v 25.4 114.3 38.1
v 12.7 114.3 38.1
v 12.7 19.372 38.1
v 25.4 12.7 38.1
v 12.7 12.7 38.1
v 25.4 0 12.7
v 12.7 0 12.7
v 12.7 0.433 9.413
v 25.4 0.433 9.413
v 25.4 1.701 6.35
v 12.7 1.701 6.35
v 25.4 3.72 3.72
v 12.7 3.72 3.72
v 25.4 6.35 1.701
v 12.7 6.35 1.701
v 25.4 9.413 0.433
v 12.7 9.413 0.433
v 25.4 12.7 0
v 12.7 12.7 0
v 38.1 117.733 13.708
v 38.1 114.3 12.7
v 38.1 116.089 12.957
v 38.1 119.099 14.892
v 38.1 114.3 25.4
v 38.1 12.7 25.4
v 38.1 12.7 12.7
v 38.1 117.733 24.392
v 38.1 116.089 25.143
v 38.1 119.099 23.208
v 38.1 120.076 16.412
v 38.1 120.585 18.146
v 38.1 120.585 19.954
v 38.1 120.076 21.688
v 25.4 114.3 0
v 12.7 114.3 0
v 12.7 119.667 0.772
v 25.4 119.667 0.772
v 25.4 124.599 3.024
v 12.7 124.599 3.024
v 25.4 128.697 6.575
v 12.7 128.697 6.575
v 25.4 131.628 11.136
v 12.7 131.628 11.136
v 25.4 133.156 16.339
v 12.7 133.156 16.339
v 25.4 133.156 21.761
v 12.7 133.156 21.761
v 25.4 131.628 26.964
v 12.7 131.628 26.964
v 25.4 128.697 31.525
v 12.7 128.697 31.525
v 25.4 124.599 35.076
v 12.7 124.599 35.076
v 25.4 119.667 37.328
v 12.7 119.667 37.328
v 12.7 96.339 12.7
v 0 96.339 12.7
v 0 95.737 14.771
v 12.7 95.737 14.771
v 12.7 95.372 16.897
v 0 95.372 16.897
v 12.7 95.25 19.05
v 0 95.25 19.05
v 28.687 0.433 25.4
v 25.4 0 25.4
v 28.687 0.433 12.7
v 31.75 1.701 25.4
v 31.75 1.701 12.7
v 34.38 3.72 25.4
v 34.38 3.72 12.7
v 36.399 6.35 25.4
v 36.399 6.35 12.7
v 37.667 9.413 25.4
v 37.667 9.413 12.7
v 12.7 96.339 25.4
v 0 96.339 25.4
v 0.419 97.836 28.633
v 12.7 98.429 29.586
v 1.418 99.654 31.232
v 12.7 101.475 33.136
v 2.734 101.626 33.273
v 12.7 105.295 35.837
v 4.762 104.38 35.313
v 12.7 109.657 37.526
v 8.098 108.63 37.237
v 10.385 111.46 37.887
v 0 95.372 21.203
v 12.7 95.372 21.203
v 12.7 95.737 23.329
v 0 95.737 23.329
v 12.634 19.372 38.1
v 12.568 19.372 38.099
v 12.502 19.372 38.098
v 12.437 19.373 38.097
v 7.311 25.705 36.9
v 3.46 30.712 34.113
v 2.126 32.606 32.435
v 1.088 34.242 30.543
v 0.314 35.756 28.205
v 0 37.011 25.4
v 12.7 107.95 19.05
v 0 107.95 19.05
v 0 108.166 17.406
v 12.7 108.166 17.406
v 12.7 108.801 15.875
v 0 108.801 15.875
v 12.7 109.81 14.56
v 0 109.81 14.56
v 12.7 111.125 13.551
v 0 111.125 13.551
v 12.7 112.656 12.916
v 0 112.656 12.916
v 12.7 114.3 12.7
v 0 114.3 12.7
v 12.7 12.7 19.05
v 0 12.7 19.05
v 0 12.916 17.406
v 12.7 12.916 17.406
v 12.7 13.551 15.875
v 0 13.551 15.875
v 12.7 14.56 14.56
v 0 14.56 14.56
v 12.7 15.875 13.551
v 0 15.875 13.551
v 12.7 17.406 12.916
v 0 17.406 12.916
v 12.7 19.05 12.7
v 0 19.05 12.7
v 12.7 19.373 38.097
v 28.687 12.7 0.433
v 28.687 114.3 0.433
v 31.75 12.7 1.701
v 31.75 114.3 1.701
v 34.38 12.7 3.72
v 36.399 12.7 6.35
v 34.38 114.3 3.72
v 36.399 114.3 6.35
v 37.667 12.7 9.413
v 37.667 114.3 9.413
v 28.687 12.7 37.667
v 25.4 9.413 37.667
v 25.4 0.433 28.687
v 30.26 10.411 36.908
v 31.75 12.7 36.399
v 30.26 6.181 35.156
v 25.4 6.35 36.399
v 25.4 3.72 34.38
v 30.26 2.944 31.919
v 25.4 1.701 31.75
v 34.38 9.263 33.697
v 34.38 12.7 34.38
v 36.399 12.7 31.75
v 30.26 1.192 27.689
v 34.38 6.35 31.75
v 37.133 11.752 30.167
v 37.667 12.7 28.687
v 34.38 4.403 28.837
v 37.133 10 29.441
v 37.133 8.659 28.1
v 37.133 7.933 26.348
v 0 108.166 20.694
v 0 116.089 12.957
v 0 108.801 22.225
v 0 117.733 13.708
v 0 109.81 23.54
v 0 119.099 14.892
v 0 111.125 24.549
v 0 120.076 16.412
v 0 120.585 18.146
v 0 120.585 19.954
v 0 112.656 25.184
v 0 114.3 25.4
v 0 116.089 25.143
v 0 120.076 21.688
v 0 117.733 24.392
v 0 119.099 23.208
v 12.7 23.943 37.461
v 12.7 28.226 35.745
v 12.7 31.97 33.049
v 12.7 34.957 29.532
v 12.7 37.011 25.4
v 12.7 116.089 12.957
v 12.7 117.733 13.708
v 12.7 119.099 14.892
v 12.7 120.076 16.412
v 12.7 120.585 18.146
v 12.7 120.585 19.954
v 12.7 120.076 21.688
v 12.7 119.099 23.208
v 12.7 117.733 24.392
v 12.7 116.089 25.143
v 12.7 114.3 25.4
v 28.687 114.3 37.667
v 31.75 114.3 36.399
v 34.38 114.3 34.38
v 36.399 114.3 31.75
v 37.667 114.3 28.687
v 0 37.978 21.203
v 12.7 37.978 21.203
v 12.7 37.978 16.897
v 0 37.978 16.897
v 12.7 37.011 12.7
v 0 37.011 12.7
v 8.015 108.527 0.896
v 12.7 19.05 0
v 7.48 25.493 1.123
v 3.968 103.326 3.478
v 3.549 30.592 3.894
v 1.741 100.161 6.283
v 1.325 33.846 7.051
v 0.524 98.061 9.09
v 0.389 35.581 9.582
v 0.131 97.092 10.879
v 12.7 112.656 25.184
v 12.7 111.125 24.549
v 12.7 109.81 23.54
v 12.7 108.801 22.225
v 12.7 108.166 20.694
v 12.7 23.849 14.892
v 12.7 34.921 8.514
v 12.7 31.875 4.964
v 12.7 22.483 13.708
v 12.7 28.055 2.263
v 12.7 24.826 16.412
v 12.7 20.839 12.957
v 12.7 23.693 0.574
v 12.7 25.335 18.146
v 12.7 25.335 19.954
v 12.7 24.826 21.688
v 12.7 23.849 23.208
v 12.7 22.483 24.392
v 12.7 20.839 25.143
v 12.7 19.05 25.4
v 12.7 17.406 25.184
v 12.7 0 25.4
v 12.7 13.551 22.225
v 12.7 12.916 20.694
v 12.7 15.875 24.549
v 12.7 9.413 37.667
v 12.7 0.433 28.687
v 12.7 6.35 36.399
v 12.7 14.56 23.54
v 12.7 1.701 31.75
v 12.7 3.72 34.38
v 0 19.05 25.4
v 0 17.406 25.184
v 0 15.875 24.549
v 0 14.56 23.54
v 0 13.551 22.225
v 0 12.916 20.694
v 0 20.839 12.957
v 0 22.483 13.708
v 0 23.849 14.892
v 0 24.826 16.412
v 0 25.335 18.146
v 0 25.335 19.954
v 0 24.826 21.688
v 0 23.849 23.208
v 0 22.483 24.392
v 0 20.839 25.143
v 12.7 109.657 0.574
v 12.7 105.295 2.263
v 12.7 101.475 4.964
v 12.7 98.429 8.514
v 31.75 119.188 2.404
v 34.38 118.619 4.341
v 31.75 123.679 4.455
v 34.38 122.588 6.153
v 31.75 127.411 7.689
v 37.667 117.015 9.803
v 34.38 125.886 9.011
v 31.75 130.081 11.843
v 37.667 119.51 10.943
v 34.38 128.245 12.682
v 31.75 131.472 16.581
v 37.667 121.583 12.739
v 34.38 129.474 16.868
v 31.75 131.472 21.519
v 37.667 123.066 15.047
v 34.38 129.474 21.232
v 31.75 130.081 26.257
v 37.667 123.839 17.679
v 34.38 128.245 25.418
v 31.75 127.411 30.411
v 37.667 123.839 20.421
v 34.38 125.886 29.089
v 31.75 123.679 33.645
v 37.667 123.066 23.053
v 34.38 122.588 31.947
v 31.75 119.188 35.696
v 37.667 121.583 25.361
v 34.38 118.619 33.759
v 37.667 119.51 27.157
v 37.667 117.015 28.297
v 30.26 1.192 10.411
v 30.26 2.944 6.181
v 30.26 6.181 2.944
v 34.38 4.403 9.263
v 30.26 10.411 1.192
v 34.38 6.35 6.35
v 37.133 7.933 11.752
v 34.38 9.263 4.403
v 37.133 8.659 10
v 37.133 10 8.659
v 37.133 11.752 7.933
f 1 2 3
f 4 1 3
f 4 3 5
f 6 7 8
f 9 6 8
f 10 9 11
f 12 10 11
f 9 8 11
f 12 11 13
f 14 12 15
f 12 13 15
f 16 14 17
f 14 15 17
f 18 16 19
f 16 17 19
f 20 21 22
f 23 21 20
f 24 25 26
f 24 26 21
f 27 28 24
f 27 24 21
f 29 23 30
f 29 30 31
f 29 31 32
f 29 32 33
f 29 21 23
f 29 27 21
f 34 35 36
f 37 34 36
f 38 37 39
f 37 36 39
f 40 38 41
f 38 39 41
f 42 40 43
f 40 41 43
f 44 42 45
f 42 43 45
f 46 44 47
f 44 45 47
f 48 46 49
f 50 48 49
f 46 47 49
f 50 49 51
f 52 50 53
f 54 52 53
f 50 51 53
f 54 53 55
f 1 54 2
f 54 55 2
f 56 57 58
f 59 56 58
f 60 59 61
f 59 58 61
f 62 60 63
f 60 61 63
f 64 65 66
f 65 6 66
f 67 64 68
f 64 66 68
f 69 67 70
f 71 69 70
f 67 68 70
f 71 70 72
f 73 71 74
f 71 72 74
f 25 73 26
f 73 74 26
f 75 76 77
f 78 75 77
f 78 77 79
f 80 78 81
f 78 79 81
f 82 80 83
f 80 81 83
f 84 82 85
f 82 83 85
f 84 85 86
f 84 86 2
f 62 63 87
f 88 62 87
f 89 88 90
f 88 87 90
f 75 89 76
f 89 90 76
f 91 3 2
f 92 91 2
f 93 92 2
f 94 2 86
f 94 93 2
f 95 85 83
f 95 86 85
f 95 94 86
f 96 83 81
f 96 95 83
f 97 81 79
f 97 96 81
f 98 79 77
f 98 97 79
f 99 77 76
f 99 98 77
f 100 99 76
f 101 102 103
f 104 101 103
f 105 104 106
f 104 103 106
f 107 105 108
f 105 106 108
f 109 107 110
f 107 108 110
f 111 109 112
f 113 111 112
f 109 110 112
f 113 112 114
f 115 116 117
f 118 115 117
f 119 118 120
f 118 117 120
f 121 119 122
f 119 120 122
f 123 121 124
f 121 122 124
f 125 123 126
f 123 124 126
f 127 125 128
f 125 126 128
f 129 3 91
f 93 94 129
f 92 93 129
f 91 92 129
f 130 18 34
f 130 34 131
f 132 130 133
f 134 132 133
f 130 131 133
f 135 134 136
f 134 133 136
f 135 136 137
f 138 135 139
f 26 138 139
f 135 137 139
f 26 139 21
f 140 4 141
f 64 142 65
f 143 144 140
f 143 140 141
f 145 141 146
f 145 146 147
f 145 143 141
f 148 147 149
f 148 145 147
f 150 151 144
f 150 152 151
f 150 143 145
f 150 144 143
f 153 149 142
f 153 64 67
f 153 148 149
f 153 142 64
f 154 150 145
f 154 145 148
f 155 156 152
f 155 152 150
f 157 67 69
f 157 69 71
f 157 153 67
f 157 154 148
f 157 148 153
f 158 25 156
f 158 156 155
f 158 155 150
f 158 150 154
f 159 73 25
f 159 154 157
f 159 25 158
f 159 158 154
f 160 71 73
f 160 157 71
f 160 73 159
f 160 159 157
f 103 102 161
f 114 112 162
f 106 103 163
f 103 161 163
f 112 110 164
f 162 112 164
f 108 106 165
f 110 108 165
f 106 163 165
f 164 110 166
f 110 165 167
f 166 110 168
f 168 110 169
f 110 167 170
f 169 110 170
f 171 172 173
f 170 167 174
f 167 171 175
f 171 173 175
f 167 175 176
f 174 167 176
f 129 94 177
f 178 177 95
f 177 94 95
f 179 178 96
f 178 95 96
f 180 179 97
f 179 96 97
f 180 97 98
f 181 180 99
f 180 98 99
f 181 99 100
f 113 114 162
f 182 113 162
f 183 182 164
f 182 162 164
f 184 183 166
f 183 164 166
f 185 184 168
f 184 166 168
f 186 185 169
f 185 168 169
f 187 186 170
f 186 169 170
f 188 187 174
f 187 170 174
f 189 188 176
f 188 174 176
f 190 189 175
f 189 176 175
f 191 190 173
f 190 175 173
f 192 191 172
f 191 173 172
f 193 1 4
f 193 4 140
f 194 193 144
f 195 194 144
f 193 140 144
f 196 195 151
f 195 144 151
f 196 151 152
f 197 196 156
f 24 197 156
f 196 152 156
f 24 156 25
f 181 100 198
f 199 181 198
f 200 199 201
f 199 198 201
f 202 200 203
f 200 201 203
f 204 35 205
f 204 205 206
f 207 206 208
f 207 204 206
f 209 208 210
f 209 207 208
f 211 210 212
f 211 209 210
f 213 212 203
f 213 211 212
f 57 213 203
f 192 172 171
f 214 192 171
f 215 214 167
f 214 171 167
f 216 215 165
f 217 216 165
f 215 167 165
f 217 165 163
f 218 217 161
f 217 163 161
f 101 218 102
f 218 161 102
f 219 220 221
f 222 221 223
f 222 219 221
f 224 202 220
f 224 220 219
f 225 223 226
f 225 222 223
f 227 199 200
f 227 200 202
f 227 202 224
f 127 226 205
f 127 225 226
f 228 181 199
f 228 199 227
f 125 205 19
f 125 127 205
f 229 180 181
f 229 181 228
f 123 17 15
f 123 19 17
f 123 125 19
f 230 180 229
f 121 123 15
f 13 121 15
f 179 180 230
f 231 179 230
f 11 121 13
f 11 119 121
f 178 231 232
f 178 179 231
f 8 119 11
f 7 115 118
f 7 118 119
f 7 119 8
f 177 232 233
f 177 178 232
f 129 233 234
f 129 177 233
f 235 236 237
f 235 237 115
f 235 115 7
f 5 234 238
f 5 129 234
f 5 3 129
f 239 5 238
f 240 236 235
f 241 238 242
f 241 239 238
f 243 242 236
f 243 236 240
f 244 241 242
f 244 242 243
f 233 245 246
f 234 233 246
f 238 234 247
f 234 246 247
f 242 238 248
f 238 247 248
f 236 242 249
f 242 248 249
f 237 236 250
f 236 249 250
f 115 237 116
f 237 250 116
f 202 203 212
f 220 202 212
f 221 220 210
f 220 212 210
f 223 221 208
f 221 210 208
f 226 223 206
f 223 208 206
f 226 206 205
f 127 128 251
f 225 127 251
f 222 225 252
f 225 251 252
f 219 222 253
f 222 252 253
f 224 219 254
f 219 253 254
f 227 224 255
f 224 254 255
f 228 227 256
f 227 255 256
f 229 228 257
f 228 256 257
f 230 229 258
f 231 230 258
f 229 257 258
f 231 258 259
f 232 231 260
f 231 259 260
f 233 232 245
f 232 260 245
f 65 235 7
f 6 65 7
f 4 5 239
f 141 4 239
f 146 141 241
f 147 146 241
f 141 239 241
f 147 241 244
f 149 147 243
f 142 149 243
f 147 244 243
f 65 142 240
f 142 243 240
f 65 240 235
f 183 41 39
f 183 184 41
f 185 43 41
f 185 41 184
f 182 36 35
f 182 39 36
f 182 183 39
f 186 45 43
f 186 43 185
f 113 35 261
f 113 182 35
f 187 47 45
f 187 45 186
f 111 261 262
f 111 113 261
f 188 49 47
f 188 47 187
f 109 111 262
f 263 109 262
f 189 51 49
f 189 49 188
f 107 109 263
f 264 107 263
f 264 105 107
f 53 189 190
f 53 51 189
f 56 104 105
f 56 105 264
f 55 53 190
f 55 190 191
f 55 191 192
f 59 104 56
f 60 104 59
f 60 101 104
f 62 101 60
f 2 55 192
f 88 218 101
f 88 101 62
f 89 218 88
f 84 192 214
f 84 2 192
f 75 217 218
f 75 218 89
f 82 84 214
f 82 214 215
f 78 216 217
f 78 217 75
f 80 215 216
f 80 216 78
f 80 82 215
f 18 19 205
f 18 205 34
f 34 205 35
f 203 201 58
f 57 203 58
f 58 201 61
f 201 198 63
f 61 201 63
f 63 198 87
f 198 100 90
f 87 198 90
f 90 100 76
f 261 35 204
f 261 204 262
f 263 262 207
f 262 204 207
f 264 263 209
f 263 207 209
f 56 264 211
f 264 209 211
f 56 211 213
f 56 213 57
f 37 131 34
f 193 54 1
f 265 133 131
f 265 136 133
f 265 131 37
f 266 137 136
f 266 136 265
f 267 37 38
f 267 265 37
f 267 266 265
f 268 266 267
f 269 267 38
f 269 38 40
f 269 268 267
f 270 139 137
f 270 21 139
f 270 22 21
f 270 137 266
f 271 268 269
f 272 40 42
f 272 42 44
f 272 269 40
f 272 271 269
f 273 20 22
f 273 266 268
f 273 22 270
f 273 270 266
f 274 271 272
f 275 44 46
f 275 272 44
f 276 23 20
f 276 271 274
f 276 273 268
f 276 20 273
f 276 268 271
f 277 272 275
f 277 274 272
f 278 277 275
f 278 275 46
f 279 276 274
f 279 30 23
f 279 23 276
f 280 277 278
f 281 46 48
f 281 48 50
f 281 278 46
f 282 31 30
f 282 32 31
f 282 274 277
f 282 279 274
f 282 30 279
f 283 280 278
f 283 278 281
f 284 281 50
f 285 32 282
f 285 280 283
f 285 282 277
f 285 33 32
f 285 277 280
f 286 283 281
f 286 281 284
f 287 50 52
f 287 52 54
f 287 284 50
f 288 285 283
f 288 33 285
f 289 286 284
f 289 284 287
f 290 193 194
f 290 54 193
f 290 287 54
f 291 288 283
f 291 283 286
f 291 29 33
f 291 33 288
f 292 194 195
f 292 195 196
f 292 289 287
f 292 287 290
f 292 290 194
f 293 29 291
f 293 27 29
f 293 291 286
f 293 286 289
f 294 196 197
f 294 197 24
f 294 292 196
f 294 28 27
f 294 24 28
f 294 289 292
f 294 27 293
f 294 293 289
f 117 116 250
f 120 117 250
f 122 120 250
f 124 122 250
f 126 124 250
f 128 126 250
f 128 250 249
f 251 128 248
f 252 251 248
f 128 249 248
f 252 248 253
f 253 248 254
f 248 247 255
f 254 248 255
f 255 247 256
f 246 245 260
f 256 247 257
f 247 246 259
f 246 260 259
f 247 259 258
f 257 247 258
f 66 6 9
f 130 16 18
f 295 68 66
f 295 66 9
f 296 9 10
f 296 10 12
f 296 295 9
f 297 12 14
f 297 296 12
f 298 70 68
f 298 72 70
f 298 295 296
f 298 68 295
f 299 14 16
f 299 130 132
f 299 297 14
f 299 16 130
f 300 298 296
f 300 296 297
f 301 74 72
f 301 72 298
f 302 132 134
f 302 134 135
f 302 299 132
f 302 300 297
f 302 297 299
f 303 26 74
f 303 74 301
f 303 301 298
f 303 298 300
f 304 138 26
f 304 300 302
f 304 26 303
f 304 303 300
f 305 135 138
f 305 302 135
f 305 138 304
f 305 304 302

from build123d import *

# Parameters (mm, degrees)
F1_DEPTH = 38.1
F2_R     = 12.7
F4_DEPTH = 12.7


with BuildPart() as f1:
    # F0 (on Right) → F1 (new body)
    with BuildSketch(Plane.YZ):
        with BuildLine():
            ThreePointArc((0, 12.7), (3.7197438789, 3.7197438789), (12.7, 0))
            Line((12.7, 0), (88.9, 0))
            Line((88.9, 0), (114.3, 0))
            ThreePointArc((114.3, 0), (133.35, 19.05), (114.3, 38.1))
            Line((114.3, 38.1), (88.9, 38.1))
            Line((88.9, 38.1), (12.7, 38.1))
            ThreePointArc((12.7, 38.1), (3.7197438789, 34.3802561211), (0, 25.4))
            Line((0, 25.4), (0, 12.7))
        make_face()
    extrude(amount=F1_DEPTH)

    # F2
    f2_edges = [f1.edges().sort_by_distance(p)[0] for p in [
        (38.1, 0, 19.05),
        (38.1, 3.719744, 3.719744),
        (38.1, 63.5, 0),
        (38.1, 133.35, 19.05),
        (38.1, 63.5, 38.1),
        (38.1, 3.719744, 34.380256),
        (0, 0, 19.05),
        (0, 3.719744, 3.719744),
        (0, 63.5, 0),
        (0, 133.35, 19.05),
        (0, 63.5, 38.1),
        (0, 3.719744, 34.380256),
    ]]
    fillet(f2_edges, radius=F2_R)

    # F3 (on face) → F4 (cut)
    with BuildSketch(Plane(origin=(0, 0, 0), x_dir=(0, -1, 0), z_dir=(-1, 0, 0))):
        with BuildLine():
            ThreePointArc((-114.3, 25.4), (-109.8098719395, 23.5401280605), (-107.95, 19.05))
            ThreePointArc((-107.95, 19.05), (-109.8098719395, 14.5598719395), (-114.3, 12.7))
            Line((-114.3, 12.7), (-96.3394877579, 12.7))
            ThreePointArc((-96.3394877579, 12.7), (-95.5243474386, 15.8286073053), (-95.25, 19.05))
            ThreePointArc((-95.25, 19.05), (-95.5243474386, 22.2713926947), (-96.3394877579, 25.4))
            Line((-96.3394877579, 25.4), (-114.3, 25.4))
        make_face()
        with BuildLine():
            ThreePointArc((-114.3, 12.7), (-120.65, 19.05), (-114.3, 25.4))
            Line((-114.3, 25.4), (-96.3394877579, 25.4))
            ThreePointArc((-96.3394877579, 25.4), (-133.35, 19.05), (-96.3394877579, 12.7))
            Line((-96.3394877579, 12.7), (-114.3, 12.7))
        make_face()
        with BuildLine():
            Line((-19.05, 25.4), (-37.0105122421, 25.4))
            ThreePointArc((-37.0105122421, 25.4), (-38.1, 19.05), (-37.0105122421, 12.7))
            Line((-37.0105122421, 12.7), (-19.0500000394, 12.7))
            ThreePointArc((-19.0500000394, 12.7), (-25.4, 19.0500000197), (-19.05, 25.4))
        make_face()
        with BuildLine():
            ThreePointArc((-19.3726803674, 38.0972669268), (-30.1798665694, 34.5105488307), (-37.0105122421, 25.4))
            Line((-37.0105122421, 25.4), (-19.05, 25.4))
            Line((-19.05, 25.4), (-12.7, 25.4))
            Line((-12.7, 25.4), (-12.7, 19.05))
            Line((-12.7, 19.05), (-12.7, 12.7))
            Line((-12.7, 12.7), (-19.0500000394, 12.7))
            Line((-19.0500000394, 12.7), (-37.0105122421, 12.7))
            ThreePointArc((-37.0105122421, 12.7), (-30.0485226281, 3.4957401333), (-19.05, 0))
            Line((-19.05, 0), (-15.2826001868, -14.698324725))
            Line((-15.2826001868, -14.698324725), (7.5956550427, -14.698324725))
            Line((7.5956550427, -14.698324725), (22.0383554697, 45.6287078559))
            Line((22.0383554697, 45.6287078559), (-15.4104121029, 51.7636574805))
            Line((-15.4104121029, 51.7636574805), (-19.3726803674, 38.0972669268))
        make_face()
        with BuildLine():
            Line((-12.7, 25.4), (-19.05, 25.4))
            ThreePointArc((-19.05, 25.4), (-14.5598719395, 23.5401280605), (-12.7, 19.05))
            Line((-12.7, 19.05), (-12.7, 25.4))
        make_face()
        with BuildLine():
            ThreePointArc((-12.7, 19.05), (-14.5598719534, 14.5598719255), (-19.0500000394, 12.7))
            Line((-19.0500000394, 12.7), (-12.7, 12.7))
            Line((-12.7, 12.7), (-12.7, 19.05))
        make_face()
    extrude(amount=-F4_DEPTH, mode=Mode.SUBTRACT)


solid = f1.part
